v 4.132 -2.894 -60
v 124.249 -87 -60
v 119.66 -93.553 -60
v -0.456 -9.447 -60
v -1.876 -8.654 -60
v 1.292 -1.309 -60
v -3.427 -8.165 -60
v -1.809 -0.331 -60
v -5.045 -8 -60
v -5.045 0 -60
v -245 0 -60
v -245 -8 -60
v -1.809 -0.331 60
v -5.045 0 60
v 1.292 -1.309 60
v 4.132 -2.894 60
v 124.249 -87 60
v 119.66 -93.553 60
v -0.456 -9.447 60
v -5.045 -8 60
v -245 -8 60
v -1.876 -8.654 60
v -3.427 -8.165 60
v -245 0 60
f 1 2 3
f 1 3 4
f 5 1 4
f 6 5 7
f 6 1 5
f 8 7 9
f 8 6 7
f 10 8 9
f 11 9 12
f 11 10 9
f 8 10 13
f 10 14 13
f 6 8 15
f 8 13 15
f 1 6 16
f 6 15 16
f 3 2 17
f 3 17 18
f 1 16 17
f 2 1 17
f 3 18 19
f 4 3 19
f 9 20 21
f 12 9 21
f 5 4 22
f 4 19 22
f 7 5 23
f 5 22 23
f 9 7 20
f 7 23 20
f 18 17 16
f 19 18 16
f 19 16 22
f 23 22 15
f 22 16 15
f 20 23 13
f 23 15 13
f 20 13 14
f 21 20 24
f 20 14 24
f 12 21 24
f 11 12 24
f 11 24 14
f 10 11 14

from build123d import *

# Parameters (mm, degrees)
SM_BASE_FLANGE_1_DEPTH = 60
CUT_EXTRUDE_1_DEPTH    = 306.076680355


# Sheet-metal steps are written as plain solids
with BuildPart() as part:
    # Sketch 1 → 基体-法兰1 (new, symmetric)
    with BuildSketch(Plane.XY):
        with BuildLine():
            Line((-245, 0), (-5.044780622, 0))
            ThreePointArc((-5.044780622, 0), (-0.23348783, -0.740528788), (4.13244236, -2.893567291))
            Line((4.13244236, -2.893567291), (185.659240876, -130))
            Line((185.659240876, -130), (181.070629386, -136.553216354))
            Line((181.070629386, -136.553216354), (-0.456169131, -9.446783646))
            ThreePointArc((-0.456169131, -9.446783646), (-2.639134226, -8.370264394), (-5.044780622, -8))
            Line((-5.044780622, -8), (-245, -8))
            Line((-245, -8), (-245, 0))
        make_face()
    extrude(amount=SM_BASE_FLANGE_1_DEPTH, both=True)

    # 草图6 → 切除-拉伸1 (cut, through all)
    with BuildSketch(Plane.XY.offset(60)):
        Polygon((124.248876587, -87), (119.660265096, -93.553216354), (181.070629386, -136.553216354), (185.659240876, -130), align=None)
    extrude(amount=-CUT_EXTRUDE_1_DEPTH, mode=Mode.SUBTRACT)


solid = part.part
